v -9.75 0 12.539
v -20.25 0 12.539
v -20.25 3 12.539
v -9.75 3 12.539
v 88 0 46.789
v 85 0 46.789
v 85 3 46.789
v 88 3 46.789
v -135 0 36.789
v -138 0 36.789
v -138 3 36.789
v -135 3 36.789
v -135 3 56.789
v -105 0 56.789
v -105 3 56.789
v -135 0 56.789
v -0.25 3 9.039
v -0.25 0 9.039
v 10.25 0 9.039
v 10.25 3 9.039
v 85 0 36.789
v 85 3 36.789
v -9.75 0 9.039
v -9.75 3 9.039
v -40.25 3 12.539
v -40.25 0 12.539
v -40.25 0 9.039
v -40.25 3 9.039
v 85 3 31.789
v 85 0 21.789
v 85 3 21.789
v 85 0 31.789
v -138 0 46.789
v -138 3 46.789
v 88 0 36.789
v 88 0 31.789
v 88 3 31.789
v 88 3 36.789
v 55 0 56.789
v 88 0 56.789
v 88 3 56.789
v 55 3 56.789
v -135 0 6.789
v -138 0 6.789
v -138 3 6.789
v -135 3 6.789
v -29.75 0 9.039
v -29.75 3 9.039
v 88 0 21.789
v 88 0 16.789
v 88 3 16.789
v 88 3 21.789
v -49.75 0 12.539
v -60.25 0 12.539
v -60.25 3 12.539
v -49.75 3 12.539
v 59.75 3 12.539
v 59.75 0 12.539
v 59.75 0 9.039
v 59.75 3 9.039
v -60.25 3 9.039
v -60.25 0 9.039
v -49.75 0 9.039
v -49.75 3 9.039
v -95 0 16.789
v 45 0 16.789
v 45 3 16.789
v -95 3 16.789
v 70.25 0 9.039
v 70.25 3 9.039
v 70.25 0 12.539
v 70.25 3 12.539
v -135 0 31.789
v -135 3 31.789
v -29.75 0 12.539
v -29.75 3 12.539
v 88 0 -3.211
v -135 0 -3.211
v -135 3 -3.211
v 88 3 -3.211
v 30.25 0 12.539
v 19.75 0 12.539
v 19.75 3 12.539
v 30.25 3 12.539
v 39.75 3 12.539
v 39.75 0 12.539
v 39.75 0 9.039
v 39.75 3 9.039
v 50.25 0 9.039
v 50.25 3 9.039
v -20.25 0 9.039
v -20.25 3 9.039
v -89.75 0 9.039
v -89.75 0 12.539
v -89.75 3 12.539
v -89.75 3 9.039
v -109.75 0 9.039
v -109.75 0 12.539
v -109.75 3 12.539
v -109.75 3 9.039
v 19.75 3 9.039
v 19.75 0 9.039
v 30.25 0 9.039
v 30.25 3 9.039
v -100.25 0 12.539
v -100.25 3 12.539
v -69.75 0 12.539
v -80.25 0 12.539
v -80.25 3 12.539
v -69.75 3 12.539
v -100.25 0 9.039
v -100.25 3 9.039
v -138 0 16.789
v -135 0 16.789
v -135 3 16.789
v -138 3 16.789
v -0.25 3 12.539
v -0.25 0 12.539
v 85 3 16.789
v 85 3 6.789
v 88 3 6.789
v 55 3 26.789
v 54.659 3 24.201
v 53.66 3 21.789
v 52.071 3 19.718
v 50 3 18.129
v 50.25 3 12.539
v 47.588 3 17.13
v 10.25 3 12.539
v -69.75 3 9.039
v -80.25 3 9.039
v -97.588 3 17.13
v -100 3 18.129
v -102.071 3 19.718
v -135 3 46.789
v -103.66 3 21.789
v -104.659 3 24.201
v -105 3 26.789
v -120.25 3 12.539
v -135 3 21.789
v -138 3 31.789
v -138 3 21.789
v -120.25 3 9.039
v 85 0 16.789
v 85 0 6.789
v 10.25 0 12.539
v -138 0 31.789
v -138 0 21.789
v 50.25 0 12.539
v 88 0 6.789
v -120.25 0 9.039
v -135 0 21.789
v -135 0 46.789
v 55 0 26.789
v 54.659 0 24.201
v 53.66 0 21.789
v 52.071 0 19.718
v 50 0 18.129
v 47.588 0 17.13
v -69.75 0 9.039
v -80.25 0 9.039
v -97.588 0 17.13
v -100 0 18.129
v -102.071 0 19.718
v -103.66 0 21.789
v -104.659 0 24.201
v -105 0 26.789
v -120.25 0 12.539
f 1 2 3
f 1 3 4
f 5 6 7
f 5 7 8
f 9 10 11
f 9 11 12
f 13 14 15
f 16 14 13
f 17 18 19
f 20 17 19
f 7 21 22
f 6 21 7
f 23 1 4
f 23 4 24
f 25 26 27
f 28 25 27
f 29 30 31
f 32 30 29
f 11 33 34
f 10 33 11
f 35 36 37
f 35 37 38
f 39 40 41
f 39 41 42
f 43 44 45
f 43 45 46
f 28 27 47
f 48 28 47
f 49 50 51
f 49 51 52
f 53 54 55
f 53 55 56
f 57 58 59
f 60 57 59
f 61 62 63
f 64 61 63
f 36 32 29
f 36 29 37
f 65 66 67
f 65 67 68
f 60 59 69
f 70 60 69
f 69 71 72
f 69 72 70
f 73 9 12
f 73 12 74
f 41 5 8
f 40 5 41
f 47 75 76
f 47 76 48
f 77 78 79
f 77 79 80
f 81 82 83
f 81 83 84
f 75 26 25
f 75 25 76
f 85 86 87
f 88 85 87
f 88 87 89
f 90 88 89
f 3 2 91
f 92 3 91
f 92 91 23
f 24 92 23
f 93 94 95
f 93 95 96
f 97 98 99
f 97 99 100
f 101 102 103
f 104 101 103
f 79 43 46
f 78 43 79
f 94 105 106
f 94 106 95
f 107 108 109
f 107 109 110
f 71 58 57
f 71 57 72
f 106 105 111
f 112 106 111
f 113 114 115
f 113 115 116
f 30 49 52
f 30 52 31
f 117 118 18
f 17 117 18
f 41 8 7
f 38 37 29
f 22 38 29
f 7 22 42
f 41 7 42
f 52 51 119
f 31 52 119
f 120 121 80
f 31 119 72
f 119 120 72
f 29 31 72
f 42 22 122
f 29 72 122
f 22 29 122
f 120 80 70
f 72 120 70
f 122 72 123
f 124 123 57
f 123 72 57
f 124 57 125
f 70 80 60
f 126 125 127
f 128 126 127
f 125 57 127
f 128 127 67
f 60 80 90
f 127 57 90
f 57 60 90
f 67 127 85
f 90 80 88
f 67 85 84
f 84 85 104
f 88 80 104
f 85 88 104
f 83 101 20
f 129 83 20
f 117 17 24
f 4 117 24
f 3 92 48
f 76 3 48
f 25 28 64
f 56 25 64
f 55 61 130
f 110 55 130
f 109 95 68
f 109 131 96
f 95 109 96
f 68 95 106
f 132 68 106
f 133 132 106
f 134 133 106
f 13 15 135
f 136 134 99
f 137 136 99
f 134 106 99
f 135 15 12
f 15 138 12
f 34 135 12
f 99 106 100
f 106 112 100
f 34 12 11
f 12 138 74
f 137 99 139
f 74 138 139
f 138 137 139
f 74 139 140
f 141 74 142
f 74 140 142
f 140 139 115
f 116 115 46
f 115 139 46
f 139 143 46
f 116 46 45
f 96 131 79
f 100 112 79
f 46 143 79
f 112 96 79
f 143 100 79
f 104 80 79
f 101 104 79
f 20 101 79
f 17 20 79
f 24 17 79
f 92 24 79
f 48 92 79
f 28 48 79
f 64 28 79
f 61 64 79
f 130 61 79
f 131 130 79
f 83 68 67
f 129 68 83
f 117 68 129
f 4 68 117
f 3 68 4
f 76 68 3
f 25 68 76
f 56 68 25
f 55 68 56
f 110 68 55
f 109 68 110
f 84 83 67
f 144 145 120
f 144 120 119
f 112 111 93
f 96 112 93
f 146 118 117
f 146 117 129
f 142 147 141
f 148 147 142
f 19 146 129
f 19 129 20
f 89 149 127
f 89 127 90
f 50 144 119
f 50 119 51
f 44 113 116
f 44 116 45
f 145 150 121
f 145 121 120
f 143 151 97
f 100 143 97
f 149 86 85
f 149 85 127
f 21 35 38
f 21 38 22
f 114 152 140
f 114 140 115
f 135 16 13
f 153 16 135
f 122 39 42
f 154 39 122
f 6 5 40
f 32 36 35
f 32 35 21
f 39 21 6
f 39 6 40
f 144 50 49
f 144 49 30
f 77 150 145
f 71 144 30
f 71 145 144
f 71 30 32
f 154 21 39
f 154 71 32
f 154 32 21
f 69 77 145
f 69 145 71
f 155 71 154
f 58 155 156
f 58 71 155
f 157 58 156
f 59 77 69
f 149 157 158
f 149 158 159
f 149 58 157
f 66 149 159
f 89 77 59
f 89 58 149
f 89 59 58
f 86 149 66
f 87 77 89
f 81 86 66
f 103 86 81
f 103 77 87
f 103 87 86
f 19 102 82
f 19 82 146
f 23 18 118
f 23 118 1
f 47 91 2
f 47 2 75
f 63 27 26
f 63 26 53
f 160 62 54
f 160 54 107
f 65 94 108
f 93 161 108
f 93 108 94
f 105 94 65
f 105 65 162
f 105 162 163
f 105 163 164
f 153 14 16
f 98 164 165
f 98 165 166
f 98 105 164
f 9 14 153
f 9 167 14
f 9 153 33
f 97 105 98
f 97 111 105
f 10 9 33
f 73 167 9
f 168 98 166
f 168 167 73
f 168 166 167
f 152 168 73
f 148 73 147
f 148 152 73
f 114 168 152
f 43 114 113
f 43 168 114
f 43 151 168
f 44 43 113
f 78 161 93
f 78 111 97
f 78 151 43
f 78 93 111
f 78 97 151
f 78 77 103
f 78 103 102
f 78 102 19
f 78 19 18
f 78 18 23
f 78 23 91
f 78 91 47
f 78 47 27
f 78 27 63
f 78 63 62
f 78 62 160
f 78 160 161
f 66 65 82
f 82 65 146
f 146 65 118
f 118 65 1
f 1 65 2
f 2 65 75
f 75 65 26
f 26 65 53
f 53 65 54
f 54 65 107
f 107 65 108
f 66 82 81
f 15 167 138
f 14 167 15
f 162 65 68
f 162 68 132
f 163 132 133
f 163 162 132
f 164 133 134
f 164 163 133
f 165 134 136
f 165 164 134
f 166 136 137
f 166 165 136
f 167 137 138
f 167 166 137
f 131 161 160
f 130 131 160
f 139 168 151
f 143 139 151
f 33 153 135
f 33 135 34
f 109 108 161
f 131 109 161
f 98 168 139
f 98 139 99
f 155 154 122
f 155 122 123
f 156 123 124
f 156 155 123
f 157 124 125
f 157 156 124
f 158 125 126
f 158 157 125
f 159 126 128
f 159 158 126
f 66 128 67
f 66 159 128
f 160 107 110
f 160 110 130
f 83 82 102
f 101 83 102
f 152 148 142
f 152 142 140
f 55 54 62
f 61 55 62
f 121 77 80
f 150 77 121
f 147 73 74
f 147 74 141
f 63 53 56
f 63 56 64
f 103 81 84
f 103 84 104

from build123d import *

# Parameters (mm, degrees)
EXTRUDE_1_DEPTH     = 3
SKETCH_2_W          = 10.5
SKETCH_2_H          = 3.5
CUT_EXTRUDE_1_DEPTH = 150.258104234


with BuildPart() as part:
    # Эскиз1 → Бобышка-Вытянуть1 (new body)
    with BuildSketch(Plane(origin=(0, 0, 0), x_dir=(1, 0, 0), z_dir=(0, 1, 0))):
        with BuildLine():
            Line((-135, -31.788922156), (-138, -31.788922156))
            Line((-138, -31.788922156), (-138, -21.788922156))
            Line((-138, -21.788922156), (-135, -21.788922156))
            Line((-135, -21.788922156), (-135, -16.788922156))
            Line((-135, -16.788922156), (-138, -16.788922156))
            Line((-138, -16.788922156), (-138, -6.788922156))
            Line((-138, -6.788922156), (-135, -6.788922156))
            Line((-135, -6.788922156), (-135, 3.211077844))
            Line((-135, 3.211077844), (-125, 3.211077844))
            Line((-125, 3.211077844), (75, 3.211077844))
            Line((75, 3.211077844), (85, 3.211077844))
            Line((85, 3.211077844), (88, 3.211077844))
            Line((88, 3.211077844), (88, -6.788922156))
            Line((88, -6.788922156), (85, -6.788922156))
            Line((85, -6.788922156), (85, -16.788922156))
            Line((85, -16.788922156), (88, -16.788922156))
            Line((88, -16.788922156), (88, -21.788922156))
            Line((88, -21.788922156), (85, -21.788922156))
            Line((85, -21.788922156), (85, -31.788922156))
            Line((85, -31.788922156), (88, -31.788922156))
            Line((88, -31.788922156), (88, -36.788922156))
            Line((88, -36.788922156), (85, -36.788922156))
            Line((85, -36.788922156), (85, -46.788922156))
            Line((85, -46.788922156), (88, -46.788922156))
            Line((88, -46.788922156), (88, -56.788922156))
            Line((88, -56.788922156), (85, -56.788922156))
            Line((85, -56.788922156), (55, -56.788922156))
            Line((55, -56.788922156), (55, -26.788922156))
            ThreePointArc((55, -26.788922156), (52.071067812, -19.717854344), (45, -16.788922156))
            Line((45, -16.788922156), (-95, -16.788922156))
            ThreePointArc((-95, -16.788922156), (-102.071067812, -19.717854344), (-105, -26.788922156))
            Line((-105, -26.788922156), (-105, -56.788922156))
            Line((-105, -56.788922156), (-135, -56.788922156))
            Line((-135, -56.788922156), (-135, -46.788922156))
            Line((-135, -46.788922156), (-138, -46.788922156))
            Line((-138, -46.788922156), (-138, -36.788922156))
            Line((-138, -36.788922156), (-135, -36.788922156))
            Line((-135, -36.788922156), (-135, -31.788922156))
        make_face()
    extrude(amount=EXTRUDE_1_DEPTH)

    # Эскиз2 → Вырез-Вытянуть1 (cut, through all)
    with BuildSketch(Plane(origin=(0, 0, 0), x_dir=(1, 0, 0), z_dir=(0, 1, 0))):
        with Locations((-115, -10.788922156)):
            Rectangle(SKETCH_2_W, SKETCH_2_H)
        with Locations((-95, -10.788922156)):
            Rectangle(SKETCH_2_W, SKETCH_2_H)
        with Locations((-75, -10.788922156)):
            Rectangle(SKETCH_2_W, SKETCH_2_H)
        with Locations((-55, -10.788922156)):
            Rectangle(SKETCH_2_W, SKETCH_2_H)
        with Locations((-35, -10.788922156)):
            Rectangle(SKETCH_2_W, SKETCH_2_H)
        with Locations((-15, -10.788922156)):
            Rectangle(SKETCH_2_W, SKETCH_2_H)
        with Locations((5, -10.788922156)):
            Rectangle(SKETCH_2_W, SKETCH_2_H)
        with Locations((25, -10.788922156)):
            Rectangle(SKETCH_2_W, SKETCH_2_H)
        with Locations((45, -10.788922156)):
            Rectangle(SKETCH_2_W, SKETCH_2_H)
        with Locations((65, -10.788922156)):
            Rectangle(SKETCH_2_W, SKETCH_2_H)
    extrude(amount=CUT_EXTRUDE_1_DEPTH, mode=Mode.SUBTRACT)


solid = part.part
